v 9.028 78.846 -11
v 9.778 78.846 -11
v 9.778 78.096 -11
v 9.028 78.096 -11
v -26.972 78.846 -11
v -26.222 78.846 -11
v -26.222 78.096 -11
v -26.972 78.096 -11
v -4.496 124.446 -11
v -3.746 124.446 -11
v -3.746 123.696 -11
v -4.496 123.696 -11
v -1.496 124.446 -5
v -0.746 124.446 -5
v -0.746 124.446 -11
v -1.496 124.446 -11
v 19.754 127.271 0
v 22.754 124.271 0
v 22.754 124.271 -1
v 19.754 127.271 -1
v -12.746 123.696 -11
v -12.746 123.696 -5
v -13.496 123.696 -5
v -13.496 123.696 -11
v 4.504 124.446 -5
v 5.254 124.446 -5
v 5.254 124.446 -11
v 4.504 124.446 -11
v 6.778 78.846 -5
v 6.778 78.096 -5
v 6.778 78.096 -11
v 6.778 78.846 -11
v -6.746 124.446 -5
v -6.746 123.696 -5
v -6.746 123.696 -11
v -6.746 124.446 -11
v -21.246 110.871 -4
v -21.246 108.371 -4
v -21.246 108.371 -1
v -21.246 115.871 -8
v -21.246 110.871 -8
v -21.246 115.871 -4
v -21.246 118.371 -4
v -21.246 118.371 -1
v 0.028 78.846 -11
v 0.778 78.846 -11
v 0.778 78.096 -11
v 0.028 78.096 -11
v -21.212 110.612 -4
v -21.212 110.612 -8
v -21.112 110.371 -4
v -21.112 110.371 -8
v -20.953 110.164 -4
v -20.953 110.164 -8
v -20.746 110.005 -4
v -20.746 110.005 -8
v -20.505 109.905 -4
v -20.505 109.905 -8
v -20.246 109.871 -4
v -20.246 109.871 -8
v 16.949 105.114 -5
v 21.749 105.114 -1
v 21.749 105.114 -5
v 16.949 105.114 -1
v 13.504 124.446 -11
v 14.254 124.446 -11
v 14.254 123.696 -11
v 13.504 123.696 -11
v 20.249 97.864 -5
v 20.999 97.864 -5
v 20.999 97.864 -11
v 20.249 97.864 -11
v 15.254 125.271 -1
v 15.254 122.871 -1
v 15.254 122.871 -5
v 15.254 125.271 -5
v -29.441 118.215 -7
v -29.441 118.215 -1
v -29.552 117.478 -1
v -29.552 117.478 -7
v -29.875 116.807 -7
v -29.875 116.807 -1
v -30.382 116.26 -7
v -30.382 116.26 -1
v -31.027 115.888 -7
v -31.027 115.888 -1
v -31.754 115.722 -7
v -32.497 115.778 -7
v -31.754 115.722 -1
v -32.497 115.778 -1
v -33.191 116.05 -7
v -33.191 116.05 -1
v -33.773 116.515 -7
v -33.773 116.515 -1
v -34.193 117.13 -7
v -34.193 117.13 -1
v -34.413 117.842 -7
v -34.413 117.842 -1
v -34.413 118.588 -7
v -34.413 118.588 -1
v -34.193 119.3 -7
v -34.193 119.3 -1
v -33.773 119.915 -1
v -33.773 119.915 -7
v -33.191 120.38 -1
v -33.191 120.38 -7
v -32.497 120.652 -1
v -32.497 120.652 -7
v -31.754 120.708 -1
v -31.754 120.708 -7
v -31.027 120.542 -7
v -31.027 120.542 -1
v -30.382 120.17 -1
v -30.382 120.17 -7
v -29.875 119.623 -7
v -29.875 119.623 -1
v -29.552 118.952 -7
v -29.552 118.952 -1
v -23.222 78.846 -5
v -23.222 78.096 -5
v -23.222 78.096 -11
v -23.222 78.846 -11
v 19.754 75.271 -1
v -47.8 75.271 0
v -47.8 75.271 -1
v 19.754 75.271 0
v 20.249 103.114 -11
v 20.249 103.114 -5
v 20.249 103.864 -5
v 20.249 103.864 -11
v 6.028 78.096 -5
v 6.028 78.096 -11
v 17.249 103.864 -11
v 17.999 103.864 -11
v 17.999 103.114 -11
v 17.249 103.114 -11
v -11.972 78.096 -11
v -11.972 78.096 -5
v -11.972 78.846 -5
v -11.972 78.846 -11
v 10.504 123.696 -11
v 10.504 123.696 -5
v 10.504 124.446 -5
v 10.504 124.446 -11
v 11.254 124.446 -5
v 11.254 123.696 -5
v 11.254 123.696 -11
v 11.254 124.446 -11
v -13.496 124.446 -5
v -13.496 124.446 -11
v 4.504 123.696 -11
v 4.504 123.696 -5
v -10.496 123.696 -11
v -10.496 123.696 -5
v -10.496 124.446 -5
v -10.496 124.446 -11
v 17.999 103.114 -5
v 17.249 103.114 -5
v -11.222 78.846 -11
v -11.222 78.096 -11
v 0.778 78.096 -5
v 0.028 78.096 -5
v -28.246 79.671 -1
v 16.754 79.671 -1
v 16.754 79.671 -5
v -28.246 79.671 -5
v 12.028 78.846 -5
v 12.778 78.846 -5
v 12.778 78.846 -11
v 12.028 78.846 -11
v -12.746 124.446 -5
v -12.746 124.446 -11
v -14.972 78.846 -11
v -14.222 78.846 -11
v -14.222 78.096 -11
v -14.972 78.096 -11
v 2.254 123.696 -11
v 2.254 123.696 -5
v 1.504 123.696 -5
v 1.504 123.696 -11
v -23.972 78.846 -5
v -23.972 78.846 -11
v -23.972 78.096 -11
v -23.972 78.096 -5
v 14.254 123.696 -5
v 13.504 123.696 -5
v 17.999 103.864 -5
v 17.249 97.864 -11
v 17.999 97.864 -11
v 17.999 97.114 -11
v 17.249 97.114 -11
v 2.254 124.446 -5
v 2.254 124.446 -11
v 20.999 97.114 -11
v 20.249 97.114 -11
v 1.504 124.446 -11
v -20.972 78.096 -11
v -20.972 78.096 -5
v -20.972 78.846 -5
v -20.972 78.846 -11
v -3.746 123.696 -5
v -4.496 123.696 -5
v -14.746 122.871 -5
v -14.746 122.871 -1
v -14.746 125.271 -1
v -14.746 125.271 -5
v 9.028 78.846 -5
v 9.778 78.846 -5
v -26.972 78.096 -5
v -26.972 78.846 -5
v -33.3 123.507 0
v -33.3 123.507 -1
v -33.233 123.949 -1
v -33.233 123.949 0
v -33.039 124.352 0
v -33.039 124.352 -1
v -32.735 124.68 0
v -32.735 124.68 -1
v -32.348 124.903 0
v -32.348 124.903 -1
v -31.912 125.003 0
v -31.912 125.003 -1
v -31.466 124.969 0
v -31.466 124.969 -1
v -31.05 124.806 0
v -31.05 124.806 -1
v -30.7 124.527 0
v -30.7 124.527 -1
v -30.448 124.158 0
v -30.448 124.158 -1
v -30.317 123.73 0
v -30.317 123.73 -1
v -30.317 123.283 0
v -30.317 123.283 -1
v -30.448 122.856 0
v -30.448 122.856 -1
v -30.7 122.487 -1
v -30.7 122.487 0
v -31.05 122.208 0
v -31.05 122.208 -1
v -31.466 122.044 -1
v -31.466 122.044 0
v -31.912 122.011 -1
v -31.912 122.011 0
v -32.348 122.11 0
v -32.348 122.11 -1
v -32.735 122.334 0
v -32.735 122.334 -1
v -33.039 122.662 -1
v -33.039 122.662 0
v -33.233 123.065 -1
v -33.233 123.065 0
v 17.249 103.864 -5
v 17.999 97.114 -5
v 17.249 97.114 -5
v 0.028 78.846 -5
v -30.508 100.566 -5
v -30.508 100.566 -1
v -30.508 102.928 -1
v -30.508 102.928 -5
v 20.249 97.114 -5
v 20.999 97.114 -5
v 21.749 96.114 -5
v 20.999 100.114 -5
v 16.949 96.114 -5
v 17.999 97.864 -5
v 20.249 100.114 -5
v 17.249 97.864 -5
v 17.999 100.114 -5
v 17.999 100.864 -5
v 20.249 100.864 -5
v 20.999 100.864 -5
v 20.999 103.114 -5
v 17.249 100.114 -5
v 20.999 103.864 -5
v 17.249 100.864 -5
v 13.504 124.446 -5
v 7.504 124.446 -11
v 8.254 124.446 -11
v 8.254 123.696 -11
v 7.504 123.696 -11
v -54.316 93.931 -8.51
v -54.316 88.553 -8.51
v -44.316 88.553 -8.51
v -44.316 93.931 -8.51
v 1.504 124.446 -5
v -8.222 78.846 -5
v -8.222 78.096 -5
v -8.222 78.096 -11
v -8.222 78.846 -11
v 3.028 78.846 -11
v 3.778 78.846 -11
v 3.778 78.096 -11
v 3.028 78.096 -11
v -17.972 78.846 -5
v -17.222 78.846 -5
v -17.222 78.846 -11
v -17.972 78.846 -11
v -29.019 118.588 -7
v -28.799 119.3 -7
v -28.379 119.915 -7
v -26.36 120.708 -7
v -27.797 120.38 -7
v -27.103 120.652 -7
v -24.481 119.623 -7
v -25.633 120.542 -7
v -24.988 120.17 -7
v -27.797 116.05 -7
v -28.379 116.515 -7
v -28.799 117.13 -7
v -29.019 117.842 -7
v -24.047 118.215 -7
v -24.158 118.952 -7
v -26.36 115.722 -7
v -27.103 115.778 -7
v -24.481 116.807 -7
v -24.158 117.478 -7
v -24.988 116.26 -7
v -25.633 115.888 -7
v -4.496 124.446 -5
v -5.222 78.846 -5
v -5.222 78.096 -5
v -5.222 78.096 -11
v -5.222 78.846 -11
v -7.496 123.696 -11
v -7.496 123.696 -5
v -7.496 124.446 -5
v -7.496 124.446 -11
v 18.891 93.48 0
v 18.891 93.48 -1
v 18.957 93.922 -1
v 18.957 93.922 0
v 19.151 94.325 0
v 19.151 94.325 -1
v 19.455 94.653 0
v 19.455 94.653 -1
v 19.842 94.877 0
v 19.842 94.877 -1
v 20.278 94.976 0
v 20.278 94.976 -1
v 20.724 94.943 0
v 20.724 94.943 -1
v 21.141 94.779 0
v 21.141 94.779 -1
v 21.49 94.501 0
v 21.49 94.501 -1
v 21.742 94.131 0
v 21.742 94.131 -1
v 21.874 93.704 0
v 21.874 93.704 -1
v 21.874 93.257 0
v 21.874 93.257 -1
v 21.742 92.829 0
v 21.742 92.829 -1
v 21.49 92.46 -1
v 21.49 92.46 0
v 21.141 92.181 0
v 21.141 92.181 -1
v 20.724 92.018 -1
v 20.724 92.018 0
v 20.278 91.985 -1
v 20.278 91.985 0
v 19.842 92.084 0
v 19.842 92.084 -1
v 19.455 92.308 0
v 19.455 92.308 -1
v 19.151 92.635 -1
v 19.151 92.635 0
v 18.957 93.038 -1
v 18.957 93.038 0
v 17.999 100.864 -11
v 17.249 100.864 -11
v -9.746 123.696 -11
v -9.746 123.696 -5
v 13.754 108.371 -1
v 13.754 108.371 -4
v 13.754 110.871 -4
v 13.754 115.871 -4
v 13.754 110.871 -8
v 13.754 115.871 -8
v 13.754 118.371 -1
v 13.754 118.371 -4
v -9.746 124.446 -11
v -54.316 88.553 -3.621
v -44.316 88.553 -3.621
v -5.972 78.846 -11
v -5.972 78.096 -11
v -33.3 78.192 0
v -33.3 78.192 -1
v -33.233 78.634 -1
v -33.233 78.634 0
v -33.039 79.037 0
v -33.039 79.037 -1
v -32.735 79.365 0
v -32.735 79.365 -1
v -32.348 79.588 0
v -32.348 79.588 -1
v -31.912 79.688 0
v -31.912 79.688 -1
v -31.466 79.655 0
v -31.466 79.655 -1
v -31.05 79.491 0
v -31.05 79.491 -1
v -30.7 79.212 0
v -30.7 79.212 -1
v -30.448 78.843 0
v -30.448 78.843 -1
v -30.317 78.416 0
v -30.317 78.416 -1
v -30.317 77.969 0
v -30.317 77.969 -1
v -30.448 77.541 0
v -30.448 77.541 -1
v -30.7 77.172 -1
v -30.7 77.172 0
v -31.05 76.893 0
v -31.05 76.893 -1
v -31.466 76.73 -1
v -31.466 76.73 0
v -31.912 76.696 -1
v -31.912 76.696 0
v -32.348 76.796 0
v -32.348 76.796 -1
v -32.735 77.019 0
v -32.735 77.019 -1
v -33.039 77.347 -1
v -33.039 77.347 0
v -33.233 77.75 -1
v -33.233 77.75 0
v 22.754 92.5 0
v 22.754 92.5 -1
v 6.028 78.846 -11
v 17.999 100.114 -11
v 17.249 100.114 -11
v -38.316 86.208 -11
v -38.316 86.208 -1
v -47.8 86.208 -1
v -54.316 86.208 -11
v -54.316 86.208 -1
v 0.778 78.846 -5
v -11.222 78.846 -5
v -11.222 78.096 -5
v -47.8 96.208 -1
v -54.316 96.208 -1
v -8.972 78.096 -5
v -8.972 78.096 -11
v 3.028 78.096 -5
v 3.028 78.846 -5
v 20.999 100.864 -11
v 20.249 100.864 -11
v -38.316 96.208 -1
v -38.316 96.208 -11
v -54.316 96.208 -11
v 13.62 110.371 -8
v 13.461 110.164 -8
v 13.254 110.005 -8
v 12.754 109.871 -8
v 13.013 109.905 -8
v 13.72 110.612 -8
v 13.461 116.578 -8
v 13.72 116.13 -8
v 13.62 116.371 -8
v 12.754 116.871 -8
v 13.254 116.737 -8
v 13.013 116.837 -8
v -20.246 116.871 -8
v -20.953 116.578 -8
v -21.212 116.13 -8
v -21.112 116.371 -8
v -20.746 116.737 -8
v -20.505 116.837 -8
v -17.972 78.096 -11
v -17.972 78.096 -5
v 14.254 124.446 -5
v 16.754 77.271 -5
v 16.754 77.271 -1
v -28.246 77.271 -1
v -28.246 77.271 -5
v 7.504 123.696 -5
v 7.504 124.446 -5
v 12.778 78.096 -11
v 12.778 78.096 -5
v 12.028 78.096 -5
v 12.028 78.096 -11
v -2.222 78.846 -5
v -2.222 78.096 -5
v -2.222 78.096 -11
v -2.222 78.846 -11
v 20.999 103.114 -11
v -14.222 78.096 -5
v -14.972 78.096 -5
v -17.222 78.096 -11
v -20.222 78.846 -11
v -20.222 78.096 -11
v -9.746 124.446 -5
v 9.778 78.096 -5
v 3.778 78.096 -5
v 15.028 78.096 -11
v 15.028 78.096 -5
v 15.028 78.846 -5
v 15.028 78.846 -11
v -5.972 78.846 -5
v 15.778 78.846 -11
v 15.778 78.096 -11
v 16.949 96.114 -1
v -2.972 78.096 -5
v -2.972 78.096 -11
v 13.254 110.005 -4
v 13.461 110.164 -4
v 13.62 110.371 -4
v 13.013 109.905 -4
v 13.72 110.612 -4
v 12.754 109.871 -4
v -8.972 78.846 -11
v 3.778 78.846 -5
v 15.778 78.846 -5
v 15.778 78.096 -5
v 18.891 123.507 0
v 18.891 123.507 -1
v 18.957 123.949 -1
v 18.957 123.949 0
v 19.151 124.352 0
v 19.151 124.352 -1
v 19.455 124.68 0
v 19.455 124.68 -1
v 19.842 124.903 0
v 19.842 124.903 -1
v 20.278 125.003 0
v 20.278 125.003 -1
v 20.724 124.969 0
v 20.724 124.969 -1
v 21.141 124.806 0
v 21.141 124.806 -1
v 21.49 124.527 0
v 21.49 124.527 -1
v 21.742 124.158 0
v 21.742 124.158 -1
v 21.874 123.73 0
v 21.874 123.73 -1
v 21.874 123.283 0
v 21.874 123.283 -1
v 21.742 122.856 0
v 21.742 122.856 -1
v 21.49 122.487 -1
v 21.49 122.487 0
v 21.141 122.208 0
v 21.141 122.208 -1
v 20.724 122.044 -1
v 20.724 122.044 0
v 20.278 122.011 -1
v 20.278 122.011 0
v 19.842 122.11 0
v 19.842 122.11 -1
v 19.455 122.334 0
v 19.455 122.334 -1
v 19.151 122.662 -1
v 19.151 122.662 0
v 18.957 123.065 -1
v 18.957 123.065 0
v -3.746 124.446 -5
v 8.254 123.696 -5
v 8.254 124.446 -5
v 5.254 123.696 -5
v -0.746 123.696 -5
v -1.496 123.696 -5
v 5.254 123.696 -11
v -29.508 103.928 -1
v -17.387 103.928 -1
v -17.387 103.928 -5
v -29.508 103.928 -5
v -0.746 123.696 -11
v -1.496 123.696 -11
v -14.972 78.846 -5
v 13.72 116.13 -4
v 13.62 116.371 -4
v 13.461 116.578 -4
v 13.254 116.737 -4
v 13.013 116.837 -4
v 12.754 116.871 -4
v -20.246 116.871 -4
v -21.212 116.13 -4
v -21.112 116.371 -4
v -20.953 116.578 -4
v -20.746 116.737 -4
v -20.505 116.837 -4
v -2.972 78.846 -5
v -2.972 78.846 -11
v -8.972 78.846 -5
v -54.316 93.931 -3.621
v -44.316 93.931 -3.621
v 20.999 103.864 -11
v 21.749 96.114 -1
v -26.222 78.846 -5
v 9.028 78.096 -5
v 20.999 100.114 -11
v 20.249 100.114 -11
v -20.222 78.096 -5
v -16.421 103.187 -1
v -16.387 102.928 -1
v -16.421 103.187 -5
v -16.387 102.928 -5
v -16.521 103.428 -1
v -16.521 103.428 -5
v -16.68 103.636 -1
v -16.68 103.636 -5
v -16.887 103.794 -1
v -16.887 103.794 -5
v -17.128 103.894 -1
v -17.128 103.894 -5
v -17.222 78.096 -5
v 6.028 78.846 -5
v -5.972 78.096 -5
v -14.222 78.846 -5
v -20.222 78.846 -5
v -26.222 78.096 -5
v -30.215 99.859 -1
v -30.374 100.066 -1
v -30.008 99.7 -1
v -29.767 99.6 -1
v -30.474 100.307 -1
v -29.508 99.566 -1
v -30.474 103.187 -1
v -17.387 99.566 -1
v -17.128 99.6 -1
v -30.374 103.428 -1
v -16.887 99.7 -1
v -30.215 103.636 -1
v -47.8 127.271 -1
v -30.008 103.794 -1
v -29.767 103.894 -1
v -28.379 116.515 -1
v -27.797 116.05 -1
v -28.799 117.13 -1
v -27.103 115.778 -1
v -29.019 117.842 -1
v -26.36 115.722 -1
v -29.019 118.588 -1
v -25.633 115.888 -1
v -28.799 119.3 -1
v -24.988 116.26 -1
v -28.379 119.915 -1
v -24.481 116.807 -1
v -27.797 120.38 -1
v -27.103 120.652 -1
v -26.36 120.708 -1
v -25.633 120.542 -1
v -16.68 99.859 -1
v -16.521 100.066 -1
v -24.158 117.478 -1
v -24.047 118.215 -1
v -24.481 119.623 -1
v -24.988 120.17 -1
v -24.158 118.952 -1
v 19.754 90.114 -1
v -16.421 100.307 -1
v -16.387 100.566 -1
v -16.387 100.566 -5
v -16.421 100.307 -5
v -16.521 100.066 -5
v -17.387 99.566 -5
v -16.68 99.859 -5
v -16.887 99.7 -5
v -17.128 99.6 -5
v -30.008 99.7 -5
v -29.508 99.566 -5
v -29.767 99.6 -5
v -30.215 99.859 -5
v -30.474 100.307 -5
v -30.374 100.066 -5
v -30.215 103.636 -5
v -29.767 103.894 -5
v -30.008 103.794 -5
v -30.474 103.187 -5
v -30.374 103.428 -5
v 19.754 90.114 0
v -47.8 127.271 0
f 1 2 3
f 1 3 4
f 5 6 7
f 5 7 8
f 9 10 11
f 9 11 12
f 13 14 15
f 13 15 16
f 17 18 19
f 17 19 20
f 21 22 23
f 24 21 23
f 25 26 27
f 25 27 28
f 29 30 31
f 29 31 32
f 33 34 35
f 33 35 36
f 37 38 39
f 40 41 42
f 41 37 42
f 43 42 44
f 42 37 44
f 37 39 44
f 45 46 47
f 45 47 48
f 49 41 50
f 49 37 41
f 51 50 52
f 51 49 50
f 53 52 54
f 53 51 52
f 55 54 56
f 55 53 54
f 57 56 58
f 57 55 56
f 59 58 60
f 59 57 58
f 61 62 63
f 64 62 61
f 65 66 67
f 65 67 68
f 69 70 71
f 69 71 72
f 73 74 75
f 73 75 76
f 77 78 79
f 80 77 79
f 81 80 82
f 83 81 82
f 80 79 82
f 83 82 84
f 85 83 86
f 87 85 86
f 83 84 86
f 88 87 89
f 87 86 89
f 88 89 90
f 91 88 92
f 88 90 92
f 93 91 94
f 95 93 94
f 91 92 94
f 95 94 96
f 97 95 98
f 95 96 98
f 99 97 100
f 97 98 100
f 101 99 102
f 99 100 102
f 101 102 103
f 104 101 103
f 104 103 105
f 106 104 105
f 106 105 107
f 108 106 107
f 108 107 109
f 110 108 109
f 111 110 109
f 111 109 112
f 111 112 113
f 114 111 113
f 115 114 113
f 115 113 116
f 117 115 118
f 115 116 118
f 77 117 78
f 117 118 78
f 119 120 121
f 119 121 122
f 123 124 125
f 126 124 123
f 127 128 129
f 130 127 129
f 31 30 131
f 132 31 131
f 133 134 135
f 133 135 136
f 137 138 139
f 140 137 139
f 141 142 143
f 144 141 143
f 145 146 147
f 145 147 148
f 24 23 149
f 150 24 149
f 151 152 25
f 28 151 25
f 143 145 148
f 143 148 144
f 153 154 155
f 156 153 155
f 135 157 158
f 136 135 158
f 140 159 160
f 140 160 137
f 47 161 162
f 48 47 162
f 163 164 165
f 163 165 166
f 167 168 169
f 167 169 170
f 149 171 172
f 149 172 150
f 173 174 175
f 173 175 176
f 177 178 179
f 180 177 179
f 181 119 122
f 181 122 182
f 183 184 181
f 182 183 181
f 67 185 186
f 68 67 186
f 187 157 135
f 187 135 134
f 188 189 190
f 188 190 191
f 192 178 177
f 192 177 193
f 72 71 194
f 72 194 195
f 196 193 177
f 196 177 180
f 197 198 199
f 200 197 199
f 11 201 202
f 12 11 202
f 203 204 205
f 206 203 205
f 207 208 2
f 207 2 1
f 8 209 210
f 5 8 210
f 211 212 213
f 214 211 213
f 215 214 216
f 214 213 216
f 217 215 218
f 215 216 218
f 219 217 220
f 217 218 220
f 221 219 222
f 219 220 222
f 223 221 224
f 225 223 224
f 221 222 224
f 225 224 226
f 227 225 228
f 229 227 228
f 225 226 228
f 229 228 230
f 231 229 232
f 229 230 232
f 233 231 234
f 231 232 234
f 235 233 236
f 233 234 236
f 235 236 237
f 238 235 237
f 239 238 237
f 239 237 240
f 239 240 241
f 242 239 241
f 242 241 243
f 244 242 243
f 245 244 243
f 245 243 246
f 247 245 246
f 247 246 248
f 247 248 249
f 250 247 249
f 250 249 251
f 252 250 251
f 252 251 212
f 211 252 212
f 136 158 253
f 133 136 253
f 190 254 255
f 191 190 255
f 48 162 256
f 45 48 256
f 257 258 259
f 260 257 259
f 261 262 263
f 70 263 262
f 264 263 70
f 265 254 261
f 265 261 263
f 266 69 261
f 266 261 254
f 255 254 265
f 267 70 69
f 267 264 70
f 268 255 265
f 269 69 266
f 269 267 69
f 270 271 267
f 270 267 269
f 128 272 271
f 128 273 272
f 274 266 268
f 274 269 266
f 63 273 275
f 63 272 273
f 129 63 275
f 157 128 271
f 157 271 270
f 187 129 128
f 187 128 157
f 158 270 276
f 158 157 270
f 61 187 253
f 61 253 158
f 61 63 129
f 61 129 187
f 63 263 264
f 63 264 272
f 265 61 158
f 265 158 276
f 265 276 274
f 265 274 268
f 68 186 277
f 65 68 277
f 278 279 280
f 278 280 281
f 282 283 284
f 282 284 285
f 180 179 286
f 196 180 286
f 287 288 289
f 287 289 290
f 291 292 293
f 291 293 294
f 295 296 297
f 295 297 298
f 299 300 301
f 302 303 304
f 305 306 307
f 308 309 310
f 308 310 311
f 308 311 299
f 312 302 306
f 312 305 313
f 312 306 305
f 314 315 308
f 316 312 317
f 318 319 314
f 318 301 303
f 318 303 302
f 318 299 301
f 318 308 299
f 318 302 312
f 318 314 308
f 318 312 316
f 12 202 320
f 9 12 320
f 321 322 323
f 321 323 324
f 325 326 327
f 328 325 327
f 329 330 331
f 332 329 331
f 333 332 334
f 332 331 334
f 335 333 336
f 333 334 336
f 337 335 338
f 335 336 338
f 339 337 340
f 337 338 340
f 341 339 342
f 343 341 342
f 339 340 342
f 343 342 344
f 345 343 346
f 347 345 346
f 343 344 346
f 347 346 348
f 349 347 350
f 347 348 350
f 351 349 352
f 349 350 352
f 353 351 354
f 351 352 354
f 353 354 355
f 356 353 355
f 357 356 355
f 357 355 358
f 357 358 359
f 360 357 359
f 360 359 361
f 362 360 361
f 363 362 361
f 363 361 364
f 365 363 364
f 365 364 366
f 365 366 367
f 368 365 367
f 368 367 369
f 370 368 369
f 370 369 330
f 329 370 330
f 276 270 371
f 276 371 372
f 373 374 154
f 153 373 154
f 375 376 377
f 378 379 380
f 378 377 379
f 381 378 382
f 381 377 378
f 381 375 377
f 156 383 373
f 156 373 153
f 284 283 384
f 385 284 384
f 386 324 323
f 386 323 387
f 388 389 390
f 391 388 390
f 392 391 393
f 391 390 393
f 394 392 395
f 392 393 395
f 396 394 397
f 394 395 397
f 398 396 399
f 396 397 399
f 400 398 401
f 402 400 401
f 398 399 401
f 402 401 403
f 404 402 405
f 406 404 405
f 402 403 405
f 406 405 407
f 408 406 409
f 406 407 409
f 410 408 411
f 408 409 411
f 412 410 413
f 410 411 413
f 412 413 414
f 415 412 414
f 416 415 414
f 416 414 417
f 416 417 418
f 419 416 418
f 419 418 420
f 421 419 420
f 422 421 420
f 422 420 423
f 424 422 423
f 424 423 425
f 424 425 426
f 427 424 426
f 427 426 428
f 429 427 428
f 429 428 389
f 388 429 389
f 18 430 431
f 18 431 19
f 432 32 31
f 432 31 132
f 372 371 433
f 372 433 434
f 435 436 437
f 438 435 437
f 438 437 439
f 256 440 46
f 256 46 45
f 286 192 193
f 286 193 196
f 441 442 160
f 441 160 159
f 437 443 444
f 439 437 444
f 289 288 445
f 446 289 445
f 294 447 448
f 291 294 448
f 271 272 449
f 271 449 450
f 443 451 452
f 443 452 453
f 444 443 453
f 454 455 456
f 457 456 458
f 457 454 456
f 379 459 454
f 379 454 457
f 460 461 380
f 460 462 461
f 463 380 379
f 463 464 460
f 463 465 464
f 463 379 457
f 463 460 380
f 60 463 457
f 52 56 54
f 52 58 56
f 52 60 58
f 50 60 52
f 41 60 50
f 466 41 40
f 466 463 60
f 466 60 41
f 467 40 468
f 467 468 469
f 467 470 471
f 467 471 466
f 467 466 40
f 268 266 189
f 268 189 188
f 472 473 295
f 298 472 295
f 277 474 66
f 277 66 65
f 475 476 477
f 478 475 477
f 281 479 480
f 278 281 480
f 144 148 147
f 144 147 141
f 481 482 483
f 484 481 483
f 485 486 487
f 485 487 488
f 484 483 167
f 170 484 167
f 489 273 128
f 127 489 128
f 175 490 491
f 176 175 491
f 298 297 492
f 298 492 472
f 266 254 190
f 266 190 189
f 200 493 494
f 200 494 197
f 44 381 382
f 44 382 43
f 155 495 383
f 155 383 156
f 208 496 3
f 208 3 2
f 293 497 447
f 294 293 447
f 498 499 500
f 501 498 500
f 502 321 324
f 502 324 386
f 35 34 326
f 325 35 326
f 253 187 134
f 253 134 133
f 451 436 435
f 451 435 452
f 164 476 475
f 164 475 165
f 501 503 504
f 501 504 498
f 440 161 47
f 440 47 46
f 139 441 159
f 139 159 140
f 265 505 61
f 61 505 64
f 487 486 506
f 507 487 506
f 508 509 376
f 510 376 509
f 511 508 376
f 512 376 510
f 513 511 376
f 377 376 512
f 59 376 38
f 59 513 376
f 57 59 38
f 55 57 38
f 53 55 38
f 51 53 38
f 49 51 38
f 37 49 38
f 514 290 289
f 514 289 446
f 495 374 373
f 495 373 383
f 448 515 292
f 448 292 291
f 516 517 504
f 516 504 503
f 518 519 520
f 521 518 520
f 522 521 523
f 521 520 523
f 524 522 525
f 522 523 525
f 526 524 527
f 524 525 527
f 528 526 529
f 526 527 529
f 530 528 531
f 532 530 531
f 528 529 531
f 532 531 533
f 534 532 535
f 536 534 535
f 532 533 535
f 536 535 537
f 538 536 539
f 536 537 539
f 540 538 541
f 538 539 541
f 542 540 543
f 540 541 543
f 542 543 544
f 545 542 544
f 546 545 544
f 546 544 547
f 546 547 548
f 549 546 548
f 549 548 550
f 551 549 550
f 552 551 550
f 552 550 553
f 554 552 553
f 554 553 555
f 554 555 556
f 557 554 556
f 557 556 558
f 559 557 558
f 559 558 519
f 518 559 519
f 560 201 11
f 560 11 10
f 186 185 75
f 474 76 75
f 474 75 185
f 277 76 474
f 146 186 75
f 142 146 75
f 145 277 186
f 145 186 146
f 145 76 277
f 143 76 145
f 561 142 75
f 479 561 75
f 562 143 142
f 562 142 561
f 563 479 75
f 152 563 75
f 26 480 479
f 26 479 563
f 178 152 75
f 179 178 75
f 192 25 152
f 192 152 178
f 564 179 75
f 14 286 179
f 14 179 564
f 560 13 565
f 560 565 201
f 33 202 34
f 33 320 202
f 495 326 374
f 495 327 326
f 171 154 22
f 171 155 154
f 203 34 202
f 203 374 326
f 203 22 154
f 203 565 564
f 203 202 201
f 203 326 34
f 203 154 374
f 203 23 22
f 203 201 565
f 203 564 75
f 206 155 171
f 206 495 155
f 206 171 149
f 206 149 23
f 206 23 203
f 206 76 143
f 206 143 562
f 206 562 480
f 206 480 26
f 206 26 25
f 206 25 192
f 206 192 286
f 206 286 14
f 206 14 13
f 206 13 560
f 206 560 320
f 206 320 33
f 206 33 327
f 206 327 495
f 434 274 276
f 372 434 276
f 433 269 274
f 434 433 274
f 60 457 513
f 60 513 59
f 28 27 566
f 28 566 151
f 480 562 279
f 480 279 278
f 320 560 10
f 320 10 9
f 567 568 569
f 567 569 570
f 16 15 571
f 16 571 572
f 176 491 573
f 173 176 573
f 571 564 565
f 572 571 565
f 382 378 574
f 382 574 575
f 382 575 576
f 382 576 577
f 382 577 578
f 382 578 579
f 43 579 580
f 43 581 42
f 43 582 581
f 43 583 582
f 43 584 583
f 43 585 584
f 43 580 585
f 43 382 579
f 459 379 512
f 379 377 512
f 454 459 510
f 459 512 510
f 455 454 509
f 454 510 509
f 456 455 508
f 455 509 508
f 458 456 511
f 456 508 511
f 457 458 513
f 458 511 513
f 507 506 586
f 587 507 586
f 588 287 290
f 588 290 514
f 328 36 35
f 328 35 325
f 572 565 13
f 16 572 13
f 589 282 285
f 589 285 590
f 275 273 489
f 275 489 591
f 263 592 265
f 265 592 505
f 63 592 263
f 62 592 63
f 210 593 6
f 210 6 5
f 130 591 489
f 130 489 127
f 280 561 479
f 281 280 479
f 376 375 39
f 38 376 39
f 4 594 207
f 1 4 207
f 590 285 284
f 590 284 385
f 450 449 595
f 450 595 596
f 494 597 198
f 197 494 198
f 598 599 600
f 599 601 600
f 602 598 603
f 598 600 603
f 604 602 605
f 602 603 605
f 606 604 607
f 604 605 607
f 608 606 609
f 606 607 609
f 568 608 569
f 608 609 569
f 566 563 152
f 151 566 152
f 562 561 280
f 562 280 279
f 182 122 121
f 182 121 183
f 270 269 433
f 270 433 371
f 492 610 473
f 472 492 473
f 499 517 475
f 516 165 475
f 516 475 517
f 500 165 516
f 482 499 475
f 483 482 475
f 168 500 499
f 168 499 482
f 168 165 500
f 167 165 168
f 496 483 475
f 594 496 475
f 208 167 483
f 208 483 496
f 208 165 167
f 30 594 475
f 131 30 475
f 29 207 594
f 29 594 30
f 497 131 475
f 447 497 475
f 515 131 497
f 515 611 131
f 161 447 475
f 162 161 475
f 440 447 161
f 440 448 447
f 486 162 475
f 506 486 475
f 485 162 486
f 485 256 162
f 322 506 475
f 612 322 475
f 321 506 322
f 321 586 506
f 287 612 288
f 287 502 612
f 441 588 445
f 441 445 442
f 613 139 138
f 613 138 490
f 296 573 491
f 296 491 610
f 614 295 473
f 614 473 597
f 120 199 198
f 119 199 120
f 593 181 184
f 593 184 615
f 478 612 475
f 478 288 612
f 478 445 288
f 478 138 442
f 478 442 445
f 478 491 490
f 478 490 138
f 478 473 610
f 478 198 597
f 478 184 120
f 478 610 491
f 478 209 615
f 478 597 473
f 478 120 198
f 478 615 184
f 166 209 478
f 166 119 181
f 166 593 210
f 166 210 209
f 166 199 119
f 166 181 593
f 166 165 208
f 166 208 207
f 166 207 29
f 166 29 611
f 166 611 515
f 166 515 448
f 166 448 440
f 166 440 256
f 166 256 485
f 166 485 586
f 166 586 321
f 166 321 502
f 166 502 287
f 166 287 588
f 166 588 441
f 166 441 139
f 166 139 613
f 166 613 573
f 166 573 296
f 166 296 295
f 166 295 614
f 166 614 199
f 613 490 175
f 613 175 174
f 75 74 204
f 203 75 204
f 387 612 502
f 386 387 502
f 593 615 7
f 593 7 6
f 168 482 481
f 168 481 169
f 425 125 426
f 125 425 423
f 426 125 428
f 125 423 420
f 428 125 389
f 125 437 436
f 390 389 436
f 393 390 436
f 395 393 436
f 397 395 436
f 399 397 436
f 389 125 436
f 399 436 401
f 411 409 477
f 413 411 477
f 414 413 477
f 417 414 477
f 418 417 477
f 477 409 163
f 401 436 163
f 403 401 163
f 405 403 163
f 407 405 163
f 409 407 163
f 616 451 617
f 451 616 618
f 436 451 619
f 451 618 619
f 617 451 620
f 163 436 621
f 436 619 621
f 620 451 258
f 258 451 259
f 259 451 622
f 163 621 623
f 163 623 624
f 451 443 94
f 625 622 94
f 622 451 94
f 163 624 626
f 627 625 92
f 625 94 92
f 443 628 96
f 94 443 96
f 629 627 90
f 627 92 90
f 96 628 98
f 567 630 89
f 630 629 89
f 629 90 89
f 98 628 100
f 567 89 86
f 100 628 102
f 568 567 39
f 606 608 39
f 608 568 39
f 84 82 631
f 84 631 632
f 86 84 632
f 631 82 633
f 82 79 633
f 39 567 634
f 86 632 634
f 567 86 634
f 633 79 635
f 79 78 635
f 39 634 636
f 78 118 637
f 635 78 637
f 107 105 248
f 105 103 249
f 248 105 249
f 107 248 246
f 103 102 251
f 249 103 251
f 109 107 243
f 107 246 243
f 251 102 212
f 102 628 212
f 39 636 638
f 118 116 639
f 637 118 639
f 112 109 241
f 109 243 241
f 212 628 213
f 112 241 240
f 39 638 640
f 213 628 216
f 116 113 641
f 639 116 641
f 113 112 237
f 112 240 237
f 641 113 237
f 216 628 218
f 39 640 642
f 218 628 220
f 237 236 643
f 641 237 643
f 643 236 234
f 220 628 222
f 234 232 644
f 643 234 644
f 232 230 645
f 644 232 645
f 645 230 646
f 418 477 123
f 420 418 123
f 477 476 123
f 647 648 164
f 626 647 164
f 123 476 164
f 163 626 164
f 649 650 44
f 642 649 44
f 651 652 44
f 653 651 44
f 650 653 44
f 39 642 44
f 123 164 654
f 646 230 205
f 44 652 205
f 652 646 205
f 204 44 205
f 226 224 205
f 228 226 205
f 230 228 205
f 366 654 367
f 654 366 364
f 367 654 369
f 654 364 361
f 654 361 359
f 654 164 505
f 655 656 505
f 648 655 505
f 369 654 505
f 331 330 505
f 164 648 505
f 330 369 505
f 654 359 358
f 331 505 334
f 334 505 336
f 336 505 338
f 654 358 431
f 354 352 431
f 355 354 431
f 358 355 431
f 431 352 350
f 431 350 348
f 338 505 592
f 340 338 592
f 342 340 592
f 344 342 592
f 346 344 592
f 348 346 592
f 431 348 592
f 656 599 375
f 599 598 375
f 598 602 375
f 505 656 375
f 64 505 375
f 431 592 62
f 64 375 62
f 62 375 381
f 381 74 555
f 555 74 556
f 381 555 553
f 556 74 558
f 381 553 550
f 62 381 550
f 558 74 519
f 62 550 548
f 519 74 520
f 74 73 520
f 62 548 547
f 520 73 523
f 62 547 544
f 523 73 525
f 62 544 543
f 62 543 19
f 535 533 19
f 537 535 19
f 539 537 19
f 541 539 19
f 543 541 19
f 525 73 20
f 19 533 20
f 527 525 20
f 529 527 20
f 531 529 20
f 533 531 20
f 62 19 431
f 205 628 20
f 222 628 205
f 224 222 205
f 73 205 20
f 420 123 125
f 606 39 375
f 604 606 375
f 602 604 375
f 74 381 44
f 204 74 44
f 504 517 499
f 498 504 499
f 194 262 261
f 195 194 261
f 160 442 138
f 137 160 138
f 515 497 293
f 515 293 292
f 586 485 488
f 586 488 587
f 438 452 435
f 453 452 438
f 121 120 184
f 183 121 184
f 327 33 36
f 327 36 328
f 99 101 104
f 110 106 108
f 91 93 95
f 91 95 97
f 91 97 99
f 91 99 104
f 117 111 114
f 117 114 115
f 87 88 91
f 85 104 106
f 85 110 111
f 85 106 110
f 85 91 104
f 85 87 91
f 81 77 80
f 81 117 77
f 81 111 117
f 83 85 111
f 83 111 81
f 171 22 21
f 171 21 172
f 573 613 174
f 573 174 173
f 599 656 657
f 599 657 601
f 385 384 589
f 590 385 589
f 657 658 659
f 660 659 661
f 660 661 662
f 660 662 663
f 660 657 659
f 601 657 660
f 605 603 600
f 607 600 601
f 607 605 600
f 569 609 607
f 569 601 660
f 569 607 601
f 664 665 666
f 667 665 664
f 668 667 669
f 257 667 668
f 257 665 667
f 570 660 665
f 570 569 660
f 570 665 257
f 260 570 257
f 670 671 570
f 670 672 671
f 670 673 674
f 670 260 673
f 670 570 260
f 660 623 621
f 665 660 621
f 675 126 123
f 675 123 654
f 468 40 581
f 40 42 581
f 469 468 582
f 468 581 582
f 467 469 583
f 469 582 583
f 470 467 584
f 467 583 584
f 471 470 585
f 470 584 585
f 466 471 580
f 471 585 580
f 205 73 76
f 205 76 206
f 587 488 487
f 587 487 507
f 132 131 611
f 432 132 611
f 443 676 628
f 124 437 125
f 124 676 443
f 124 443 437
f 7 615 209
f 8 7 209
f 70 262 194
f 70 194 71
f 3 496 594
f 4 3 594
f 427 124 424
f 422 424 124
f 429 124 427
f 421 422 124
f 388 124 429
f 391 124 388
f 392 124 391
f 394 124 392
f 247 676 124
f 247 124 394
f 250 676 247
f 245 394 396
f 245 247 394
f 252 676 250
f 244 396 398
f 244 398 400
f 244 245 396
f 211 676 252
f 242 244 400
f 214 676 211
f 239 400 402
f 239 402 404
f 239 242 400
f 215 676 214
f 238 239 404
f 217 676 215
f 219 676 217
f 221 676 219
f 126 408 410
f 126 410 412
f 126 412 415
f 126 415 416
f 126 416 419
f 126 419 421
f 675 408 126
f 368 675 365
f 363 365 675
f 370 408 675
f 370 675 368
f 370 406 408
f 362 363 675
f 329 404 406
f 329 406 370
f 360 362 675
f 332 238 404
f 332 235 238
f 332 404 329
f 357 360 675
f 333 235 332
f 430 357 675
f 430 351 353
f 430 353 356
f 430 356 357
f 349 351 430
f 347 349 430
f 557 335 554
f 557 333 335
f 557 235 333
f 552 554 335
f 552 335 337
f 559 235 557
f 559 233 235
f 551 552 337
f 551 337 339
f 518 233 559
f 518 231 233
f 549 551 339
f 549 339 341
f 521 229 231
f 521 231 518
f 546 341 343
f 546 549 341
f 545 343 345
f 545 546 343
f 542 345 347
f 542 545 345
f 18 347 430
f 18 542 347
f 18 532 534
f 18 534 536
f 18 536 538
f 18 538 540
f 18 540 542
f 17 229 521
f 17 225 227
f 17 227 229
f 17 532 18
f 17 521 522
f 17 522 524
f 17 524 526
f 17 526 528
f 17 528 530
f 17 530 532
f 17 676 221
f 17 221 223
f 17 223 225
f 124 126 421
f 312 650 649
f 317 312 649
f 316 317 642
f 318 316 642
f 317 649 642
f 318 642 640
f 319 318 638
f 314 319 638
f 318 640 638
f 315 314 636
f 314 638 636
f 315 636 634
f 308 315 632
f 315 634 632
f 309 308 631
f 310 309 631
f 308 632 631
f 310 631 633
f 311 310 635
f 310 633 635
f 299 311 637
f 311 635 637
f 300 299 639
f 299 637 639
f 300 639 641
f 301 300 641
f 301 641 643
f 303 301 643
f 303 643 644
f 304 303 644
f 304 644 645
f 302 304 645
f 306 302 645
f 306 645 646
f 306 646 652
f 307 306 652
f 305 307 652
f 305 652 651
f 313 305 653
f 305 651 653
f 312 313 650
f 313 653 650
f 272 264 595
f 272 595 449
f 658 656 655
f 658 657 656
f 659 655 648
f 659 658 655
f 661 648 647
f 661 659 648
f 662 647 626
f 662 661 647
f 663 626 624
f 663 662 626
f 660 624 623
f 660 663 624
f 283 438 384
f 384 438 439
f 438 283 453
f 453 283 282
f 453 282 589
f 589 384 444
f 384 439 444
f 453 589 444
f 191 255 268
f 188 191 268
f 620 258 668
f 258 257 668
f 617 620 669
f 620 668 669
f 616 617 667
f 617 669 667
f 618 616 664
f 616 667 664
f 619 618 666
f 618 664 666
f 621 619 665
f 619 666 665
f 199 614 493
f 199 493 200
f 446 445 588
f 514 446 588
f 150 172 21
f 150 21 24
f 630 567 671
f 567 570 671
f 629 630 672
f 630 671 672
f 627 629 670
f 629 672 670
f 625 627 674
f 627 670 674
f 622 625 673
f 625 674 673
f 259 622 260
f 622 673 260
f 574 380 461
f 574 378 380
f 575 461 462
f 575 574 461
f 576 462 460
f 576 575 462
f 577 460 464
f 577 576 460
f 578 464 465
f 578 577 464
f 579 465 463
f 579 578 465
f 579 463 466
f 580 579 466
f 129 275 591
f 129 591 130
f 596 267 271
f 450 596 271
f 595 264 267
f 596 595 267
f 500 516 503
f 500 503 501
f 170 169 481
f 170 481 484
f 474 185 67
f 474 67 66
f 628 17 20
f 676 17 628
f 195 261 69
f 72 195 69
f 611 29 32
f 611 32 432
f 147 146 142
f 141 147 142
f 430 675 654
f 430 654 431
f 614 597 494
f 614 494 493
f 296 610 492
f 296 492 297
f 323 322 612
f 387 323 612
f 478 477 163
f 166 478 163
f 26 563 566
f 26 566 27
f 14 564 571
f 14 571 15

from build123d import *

# Parameters (mm, degrees)
BOSS_EXTRUDE1_DEPTH  = 1
SKETCH2_W            = 16
SKETCH2_H            = 10
BOSS_EXTRUDE2_DEPTH  = 10
SKETCH3_W            = 4.889113018
SKETCH3_H            = 5.37802432
CUT_EXTRUDE1_DEPTH   = 10
SKETCH4_W            = 45
SKETCH4_H            = 2.4
SKETCH4_W_2          = 30
BOSS_EXTRUDE3_DEPTH  = 4
SKETCH5_W            = 35
SKETCH5_H            = 10
BOSS_EXTRUDE4_DEPTH  = 7
SKETCH6_W            = 35
SKETCH6_H            = 1.5
CUT_EXTRUDE2_DEPTH   = 4
FILLET1_R            = 1
SKETCH7_R            = 1.5
CUT_EXTRUDE3_DEPTH   = 4
SKETCH8_W            = 0.75
SKETCH8_H            = 0.75
BOSS_EXTRUDE5_DEPTH  = 6
LPATTERN1_COUNT      = 10
LPATTERN1_PITCH      = 3
SKETCH9_W            = 0.75
SKETCH9_H            = 0.75
BOSS_EXTRUDE6_DEPTH  = 6
LPATTERN2_COUNT      = 15
LPATTERN2_PITCH      = 3
SKETCH10_R           = 2.5
BOSS_EXTRUDE7_DEPTH  = 6
SKETCH11_W           = 4.8
SKETCH11_H           = 9
BOSS_EXTRUDE8_DEPTH  = 4
SKETCH12_W           = 0.75
SKETCH12_H           = 0.75
BOSS_EXTRUDE9_DEPTH  = 6
LPATTERN3_COUNT      = 3
LPATTERN3_PITCH      = 3
LPATTERN3_COUNT_DIR2 = 2
LPATTERN3_PITCH_DIR2 = 3
SKETCH13_W           = 14.120912951
SKETCH13_H           = 4.362558473
BOSS_EXTRUDE10_DEPTH = 4
FILLET2_R            = 1


with BuildPart() as part:
    # Sketch1 → Boss-Extrude1 (new body)
    with BuildSketch(Plane.XY):
        Polygon((22.754016647, 124.270947632), (19.754016647, 127.270947632), (-47.799898806, 127.270947632), (-47.799898806, 75.270947632), (19.754016647, 75.270947632), (19.754016647, 90.113910289), (22.754016647, 92.500164177), align=None)
    extrude(amount=-BOSS_EXTRUDE1_DEPTH)

    # Sketch2 → Boss-Extrude2 (add)
    with BuildSketch(Plane(origin=(0, 0, -1), x_dir=(-1, 0, 0), z_dir=(0, 0, -1))):
        with Locations((46.316496684, 91.208096568)):
            Rectangle(SKETCH2_W, SKETCH2_H)
    extrude(amount=BOSS_EXTRUDE2_DEPTH)

    # Sketch3 → Cut-Extrude1 (cut)
    with BuildSketch(Plane.ZY.offset(54.316496684)):
        with Locations((-6.06540843, 91.2419286)):
            Rectangle(SKETCH3_W, SKETCH3_H)
    extrude(amount=-CUT_EXTRUDE1_DEPTH, mode=Mode.SUBTRACT)

    # Sketch4 → Boss-Extrude3 (add)
    with BuildSketch(Plane(origin=(0, 0, -1), x_dir=(-1, 0, 0), z_dir=(0, 0, -1))):
        with Locations((5.745983353, 78.470947632)):
            Rectangle(SKETCH4_W, SKETCH4_H)
        with Locations((-0.254016647, 124.070947632)):
            Rectangle(SKETCH4_W_2, SKETCH4_H)
    extrude(amount=BOSS_EXTRUDE3_DEPTH)

    # Sketch5 → Boss-Extrude4 (add)
    with BuildSketch(Plane(origin=(0, 0, -1), x_dir=(-1, 0, 0), z_dir=(0, 0, -1))):
        with Locations((3.745983353, 113.370947632)):
            Rectangle(SKETCH5_W, SKETCH5_H)
    extrude(amount=BOSS_EXTRUDE4_DEPTH)

    # Sketch6 → Cut-Extrude2 (cut)
    with BuildSketch(Plane(origin=(0, 0, -8), x_dir=(-1, 0, 0), z_dir=(0, 0, -1))):
        with Locations((3.745983353, 117.620947632)):
            Rectangle(SKETCH6_W, SKETCH6_H)
        with Locations((3.745983353, 109.120947632)):
            Rectangle(SKETCH6_W, SKETCH6_H)
    extrude(amount=-CUT_EXTRUDE2_DEPTH, mode=Mode.SUBTRACT)

    # Fillet1
    fillet1_edges = [part.edges().sort_by_distance(p)[0] for p in [
        (13.754016647, 109.870947632, -6),
        (-21.245983353, 109.870947632, -6),
        (13.754016647, 116.870947632, -6),
        (-21.245983353, 116.870947632, -6),
    ]]
    fillet(fillet1_edges, radius=FILLET1_R)

    # Sketch7 → Cut-Extrude3 (cut)
    with BuildSketch(Plane(origin=(0, 0, -1), x_dir=(-1, 0, 0), z_dir=(0, 0, -1))):
        with Locations((-20.390504743, 123.506772987)):
            Circle(SKETCH7_R)
        with Locations((-20.390504743, 93.48031176)):
            Circle(SKETCH7_R)
        with Locations((31.799898806, 123.506772987)):
            Circle(SKETCH7_R)
        with Locations((31.799898806, 78.192140702)):
            Circle(SKETCH7_R)
    extrude(amount=-CUT_EXTRUDE3_DEPTH, mode=Mode.SUBTRACT)

    # Sketch8 → Boss-Extrude5 (add)
    with BuildSketch(Plane(origin=(0, 0, -5), x_dir=(-1, 0, 0), z_dir=(0, 0, -1))):
        with Locations((-13.879016647, 124.070947632)):
            Rectangle(SKETCH8_W, SKETCH8_H)
    boss_extrude5 = extrude(amount=BOSS_EXTRUDE5_DEPTH)

    # LPattern1: Boss-Extrude5 ×10
    with Locations(*[(-i * LPATTERN1_PITCH, 0, 0) for i in range(1, LPATTERN1_COUNT)]):
        add(boss_extrude5)

    # Sketch9 → Boss-Extrude6 (add)
    with BuildSketch(Plane(origin=(0, 0, -5), x_dir=(-1, 0, 0), z_dir=(0, 0, -1))):
        with Locations((-15.402792453, 78.470947632)):
            Rectangle(SKETCH9_W, SKETCH9_H)
    boss_extrude6 = extrude(amount=BOSS_EXTRUDE6_DEPTH)

    # LPattern2: Boss-Extrude6 ×15
    with Locations(*[(-i * LPATTERN2_PITCH, 0, 0) for i in range(1, LPATTERN2_COUNT)]):
        add(boss_extrude6)

    # Sketch10 → Boss-Extrude7 (add)
    with BuildSketch(Plane(origin=(0, 0, -1), x_dir=(-1, 0, 0), z_dir=(0, 0, -1))):
        with Locations(Location((26.546732083, 118.214976991, 0), (0, 0, 180))):
            Circle(SKETCH10_R)
        with Locations(Location((31.940661119, 118.214976991, 0), (0, 0, 180))):
            Circle(SKETCH10_R)
    extrude(amount=BOSS_EXTRUDE7_DEPTH)

    # Sketch11 → Boss-Extrude8 (add)
    with BuildSketch(Plane(origin=(0, 0, -1), x_dir=(-1, 0, 0), z_dir=(0, 0, -1))):
        with Locations((-19.349242758, 100.613910289)):
            Rectangle(SKETCH11_W, SKETCH11_H)
    extrude(amount=BOSS_EXTRUDE8_DEPTH)

    # Sketch12 → Boss-Extrude9 (add)
    with BuildSketch(Plane(origin=(0, 0, -5), x_dir=(-1, 0, 0), z_dir=(0, 0, -1))):
        with Locations((-20.624242758, 97.488910289)):
            Rectangle(SKETCH12_W, SKETCH12_H)
    boss_extrude9 = extrude(amount=BOSS_EXTRUDE9_DEPTH)

    # LPattern3: Boss-Extrude9 3 × 2
    with Locations(*[(-j * LPATTERN3_PITCH_DIR2, i * LPATTERN3_PITCH, 0) for i in range(LPATTERN3_COUNT) for j in range(LPATTERN3_COUNT_DIR2) if (i, j) != (0, 0)]):
        add(boss_extrude9)

    # Sketch13 → Boss-Extrude10 (add)
    with BuildSketch(Plane(origin=(0, 0, -1), x_dir=(-1, 0, 0), z_dir=(0, 0, -1))):
        with Locations((23.447660741, 101.747194556)):
            Rectangle(SKETCH13_W, SKETCH13_H)
    extrude(amount=BOSS_EXTRUDE10_DEPTH)

    # Fillet2
    fillet2_edges = [part.edges().sort_by_distance(p)[0] for p in [
        (-16.387204265, 103.928473792, -3),
        (-16.387204265, 99.565915319, -3),
        (-30.508117216, 99.565915319, -3),
        (-30.508117216, 103.928473792, -3),
    ]]
    fillet(fillet2_edges, radius=FILLET2_R)


solid = part.part
